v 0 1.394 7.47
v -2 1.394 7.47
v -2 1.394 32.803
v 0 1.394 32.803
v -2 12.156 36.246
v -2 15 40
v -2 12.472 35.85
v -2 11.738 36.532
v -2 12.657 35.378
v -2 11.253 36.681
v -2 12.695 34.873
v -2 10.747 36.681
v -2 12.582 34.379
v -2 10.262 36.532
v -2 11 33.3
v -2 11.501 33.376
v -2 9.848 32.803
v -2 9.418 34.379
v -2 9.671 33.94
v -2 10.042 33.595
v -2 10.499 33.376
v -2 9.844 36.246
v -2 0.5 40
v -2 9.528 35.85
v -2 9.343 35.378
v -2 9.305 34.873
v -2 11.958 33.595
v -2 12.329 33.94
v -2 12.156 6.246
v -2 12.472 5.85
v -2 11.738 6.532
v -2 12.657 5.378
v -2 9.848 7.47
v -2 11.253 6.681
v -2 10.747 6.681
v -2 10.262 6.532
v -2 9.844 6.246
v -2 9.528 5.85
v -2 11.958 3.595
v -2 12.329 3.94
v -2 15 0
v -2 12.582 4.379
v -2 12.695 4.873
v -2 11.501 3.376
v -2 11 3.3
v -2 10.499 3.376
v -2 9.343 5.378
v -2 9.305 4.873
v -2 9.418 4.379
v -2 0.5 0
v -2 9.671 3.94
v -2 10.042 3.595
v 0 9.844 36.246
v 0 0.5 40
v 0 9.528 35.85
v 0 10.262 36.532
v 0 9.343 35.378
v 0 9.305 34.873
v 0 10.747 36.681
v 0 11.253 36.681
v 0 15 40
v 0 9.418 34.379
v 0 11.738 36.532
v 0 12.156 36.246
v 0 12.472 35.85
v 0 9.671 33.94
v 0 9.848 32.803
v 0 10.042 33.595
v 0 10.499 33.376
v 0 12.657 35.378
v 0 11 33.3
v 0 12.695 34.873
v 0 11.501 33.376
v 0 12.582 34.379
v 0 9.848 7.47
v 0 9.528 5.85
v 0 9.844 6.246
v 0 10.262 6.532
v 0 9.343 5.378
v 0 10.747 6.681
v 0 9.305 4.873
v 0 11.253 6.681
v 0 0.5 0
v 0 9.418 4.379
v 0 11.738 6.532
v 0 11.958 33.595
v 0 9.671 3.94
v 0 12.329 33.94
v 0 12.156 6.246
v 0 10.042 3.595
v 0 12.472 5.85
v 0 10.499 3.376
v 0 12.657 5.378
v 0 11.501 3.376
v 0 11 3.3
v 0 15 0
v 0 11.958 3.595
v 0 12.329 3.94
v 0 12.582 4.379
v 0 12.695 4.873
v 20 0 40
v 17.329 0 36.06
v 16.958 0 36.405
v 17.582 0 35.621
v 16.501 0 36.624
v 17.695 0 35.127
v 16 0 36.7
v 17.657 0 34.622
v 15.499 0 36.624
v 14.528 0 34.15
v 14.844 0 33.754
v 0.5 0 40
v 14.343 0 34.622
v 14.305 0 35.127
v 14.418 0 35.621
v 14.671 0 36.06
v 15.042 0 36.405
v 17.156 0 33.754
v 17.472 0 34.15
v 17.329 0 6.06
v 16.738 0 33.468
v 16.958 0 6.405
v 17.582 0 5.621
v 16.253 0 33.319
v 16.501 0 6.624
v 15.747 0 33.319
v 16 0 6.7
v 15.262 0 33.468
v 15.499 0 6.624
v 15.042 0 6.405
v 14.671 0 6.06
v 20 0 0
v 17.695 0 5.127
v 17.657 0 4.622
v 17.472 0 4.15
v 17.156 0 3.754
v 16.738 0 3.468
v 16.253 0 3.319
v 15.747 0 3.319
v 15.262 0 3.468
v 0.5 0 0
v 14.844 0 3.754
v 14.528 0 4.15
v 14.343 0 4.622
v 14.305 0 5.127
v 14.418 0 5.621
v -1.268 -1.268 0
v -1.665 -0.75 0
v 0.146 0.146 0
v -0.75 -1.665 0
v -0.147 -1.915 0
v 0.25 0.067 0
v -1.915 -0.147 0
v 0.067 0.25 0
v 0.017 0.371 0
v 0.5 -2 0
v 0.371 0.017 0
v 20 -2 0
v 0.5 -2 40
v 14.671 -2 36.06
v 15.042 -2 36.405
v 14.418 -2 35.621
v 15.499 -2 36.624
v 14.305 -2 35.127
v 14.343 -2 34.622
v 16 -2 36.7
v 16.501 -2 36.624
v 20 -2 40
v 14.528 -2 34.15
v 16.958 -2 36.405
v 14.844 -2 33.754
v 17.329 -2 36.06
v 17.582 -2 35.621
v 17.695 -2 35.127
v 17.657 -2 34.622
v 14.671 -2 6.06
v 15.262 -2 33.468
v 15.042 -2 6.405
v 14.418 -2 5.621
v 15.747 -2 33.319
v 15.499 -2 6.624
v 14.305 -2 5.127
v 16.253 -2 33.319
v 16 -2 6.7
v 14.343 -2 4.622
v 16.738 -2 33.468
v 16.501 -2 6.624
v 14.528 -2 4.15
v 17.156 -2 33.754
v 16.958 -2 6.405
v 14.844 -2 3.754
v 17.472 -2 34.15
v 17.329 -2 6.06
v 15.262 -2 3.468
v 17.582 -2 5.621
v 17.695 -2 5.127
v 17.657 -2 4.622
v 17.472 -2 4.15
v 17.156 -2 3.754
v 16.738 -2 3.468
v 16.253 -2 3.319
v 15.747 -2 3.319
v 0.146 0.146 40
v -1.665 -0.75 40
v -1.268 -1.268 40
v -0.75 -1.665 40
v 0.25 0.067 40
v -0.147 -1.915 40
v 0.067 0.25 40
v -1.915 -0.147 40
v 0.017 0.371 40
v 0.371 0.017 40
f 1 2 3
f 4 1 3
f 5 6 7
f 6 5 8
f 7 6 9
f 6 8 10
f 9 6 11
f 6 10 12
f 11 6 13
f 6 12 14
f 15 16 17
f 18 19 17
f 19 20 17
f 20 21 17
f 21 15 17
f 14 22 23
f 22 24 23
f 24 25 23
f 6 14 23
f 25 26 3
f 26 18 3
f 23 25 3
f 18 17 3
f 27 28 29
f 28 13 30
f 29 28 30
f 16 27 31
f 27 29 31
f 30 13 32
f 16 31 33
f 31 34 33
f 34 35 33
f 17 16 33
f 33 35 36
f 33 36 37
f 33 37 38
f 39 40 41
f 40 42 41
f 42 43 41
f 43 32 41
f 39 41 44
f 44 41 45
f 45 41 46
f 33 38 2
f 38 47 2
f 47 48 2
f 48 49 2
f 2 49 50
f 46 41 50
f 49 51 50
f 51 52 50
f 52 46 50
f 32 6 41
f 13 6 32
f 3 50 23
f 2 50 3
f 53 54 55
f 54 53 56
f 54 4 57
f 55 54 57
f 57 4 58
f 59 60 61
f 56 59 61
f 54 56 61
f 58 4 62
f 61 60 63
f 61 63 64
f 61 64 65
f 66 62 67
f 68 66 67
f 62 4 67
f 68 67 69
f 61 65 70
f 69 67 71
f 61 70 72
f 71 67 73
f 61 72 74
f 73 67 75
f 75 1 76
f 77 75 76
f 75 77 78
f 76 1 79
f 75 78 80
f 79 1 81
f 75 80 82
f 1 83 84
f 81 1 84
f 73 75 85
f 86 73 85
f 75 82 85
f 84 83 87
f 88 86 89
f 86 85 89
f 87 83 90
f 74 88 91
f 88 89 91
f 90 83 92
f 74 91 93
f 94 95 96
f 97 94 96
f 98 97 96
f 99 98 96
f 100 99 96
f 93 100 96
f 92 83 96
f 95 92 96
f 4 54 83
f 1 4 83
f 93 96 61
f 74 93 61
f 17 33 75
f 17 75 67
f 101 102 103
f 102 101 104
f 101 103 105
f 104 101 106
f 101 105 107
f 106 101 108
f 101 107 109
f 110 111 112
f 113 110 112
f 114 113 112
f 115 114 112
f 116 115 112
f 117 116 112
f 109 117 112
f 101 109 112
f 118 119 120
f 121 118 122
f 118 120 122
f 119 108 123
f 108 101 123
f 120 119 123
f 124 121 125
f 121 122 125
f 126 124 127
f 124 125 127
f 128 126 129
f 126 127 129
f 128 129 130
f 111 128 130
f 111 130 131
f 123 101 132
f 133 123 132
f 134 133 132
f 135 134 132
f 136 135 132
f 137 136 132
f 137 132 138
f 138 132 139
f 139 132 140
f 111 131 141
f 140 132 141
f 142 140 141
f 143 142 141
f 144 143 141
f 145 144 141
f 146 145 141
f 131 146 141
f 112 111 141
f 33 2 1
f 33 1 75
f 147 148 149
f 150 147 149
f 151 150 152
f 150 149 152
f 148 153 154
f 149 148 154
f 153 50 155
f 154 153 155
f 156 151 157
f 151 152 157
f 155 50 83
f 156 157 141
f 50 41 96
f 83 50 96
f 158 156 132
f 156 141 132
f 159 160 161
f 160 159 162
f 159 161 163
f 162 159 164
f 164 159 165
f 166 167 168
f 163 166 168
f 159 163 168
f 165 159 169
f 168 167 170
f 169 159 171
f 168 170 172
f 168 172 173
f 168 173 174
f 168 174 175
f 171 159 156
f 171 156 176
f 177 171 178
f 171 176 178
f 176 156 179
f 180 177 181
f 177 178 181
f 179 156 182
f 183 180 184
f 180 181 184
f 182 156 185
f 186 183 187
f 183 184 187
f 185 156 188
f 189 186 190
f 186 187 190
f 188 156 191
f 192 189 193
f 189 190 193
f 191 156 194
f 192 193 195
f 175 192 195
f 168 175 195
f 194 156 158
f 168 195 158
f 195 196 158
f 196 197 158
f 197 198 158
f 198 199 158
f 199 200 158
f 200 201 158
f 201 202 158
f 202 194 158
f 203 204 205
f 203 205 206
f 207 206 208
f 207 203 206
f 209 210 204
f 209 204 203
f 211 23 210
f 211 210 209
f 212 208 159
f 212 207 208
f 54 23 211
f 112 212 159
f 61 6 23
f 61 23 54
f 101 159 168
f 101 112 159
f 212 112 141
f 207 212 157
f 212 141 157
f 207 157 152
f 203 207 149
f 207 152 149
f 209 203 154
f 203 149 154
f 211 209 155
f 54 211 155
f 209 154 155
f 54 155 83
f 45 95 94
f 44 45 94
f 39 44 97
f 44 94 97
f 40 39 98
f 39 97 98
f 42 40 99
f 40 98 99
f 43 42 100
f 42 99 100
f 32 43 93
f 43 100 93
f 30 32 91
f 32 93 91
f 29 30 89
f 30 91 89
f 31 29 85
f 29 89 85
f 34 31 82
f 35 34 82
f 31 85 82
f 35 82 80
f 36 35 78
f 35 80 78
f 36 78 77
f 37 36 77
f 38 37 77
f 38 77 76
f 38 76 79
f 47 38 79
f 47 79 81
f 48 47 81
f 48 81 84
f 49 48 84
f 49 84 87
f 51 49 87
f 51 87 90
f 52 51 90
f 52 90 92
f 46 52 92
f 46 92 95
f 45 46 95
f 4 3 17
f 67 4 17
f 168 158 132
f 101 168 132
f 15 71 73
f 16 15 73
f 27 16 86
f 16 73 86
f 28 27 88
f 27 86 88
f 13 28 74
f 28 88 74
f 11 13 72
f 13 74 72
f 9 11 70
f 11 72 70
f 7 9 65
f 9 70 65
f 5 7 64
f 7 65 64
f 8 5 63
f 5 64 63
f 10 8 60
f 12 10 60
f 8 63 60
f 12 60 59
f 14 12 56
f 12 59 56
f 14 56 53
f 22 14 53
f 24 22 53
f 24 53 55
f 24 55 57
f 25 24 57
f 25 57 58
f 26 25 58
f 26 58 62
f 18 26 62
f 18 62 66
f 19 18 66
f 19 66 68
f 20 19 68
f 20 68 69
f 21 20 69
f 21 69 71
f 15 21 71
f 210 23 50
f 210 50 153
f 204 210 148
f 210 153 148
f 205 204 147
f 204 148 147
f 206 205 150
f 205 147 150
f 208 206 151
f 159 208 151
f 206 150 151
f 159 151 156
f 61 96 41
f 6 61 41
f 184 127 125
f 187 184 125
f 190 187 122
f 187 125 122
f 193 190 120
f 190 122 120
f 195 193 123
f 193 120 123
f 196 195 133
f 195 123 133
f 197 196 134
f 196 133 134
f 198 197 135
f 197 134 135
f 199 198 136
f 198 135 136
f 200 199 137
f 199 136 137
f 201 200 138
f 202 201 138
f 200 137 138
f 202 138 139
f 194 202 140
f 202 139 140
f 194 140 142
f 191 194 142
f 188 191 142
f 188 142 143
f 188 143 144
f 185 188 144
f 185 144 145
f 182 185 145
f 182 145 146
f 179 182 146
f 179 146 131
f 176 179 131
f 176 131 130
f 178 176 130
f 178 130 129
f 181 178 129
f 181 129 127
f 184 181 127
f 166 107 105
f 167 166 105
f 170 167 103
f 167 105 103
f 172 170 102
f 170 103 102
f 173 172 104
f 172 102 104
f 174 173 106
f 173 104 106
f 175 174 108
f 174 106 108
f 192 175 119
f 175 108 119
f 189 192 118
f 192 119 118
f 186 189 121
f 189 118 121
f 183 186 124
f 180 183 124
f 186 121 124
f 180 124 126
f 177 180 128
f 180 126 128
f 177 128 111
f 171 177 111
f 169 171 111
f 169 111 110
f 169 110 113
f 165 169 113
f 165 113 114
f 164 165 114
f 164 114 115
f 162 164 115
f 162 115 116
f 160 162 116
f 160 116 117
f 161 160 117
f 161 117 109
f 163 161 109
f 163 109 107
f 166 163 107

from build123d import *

# Parameters (mm, degrees)
SM_BASE_FLANGE_1_DEPTH = 40
SKETCH_6_R             = 1.7
CUT_EXTRUDE_1_DEPTH    = 10
SKETCH_7_R             = 1.7
CUT_EXTRUDE_2_DEPTH    = 10
SKETCH_11_W            = 25.332346726
SKETCH_11_H            = 8.454216192
CUT_EXTRUDE_5_DEPTH    = 10


# Sheet-metal steps are written as plain solids
with BuildPart() as part:
    # Sketch 1 → 基体-法兰1 (new body)
    with BuildSketch(Plane.XY):
        with BuildLine():
            Line((20, 0), (0.5, 0))
            ThreePointArc((0.5, 0), (0.146446609, 0.146446609), (0, 0.5))
            Line((0, 0.5), (0, 15))
            Line((0, 15), (-2, 15))
            Line((-2, 15), (-2, 0.5))
            ThreePointArc((-2, 0.5), (-1.267766953, -1.267766953), (0.5, -2))
            Line((0.5, -2), (20, -2))
            Line((20, -2), (20, 0))
        make_face()
    extrude(amount=SM_BASE_FLANGE_1_DEPTH)

    # 草图6 → 切除-拉伸1 (cut)
    with BuildSketch(Plane(origin=(0, 0, 0), x_dir=(0, 0, -1), z_dir=(1, 0, 0))):
        with Locations((-35, 11)):
            Circle(SKETCH_6_R)
        with Locations((-5, 11)):
            Circle(SKETCH_6_R)
    extrude(amount=-CUT_EXTRUDE_1_DEPTH, mode=Mode.SUBTRACT)

    # 草图7 → 切除-拉伸2 (cut)
    with BuildSketch(Plane(origin=(0, 0, 0), x_dir=(1, 0, 0), z_dir=(0, 1, 0))):
        with Locations(Location((16, -5, 0), (0, 0, 270))):
            Circle(SKETCH_7_R)
        with Locations(Location((16, -35, 0), (0, 0, 270))):
            Circle(SKETCH_7_R)
    extrude(amount=-CUT_EXTRUDE_2_DEPTH, mode=Mode.SUBTRACT)

    # 草图11 → 切除-拉伸5 (cut)
    with BuildSketch(Plane.ZY.offset(2)):
        with Locations((20.136358326, 5.621246346)):
            Rectangle(SKETCH_11_W, SKETCH_11_H)
    extrude(amount=-CUT_EXTRUDE_5_DEPTH, mode=Mode.SUBTRACT)


solid = part.part
